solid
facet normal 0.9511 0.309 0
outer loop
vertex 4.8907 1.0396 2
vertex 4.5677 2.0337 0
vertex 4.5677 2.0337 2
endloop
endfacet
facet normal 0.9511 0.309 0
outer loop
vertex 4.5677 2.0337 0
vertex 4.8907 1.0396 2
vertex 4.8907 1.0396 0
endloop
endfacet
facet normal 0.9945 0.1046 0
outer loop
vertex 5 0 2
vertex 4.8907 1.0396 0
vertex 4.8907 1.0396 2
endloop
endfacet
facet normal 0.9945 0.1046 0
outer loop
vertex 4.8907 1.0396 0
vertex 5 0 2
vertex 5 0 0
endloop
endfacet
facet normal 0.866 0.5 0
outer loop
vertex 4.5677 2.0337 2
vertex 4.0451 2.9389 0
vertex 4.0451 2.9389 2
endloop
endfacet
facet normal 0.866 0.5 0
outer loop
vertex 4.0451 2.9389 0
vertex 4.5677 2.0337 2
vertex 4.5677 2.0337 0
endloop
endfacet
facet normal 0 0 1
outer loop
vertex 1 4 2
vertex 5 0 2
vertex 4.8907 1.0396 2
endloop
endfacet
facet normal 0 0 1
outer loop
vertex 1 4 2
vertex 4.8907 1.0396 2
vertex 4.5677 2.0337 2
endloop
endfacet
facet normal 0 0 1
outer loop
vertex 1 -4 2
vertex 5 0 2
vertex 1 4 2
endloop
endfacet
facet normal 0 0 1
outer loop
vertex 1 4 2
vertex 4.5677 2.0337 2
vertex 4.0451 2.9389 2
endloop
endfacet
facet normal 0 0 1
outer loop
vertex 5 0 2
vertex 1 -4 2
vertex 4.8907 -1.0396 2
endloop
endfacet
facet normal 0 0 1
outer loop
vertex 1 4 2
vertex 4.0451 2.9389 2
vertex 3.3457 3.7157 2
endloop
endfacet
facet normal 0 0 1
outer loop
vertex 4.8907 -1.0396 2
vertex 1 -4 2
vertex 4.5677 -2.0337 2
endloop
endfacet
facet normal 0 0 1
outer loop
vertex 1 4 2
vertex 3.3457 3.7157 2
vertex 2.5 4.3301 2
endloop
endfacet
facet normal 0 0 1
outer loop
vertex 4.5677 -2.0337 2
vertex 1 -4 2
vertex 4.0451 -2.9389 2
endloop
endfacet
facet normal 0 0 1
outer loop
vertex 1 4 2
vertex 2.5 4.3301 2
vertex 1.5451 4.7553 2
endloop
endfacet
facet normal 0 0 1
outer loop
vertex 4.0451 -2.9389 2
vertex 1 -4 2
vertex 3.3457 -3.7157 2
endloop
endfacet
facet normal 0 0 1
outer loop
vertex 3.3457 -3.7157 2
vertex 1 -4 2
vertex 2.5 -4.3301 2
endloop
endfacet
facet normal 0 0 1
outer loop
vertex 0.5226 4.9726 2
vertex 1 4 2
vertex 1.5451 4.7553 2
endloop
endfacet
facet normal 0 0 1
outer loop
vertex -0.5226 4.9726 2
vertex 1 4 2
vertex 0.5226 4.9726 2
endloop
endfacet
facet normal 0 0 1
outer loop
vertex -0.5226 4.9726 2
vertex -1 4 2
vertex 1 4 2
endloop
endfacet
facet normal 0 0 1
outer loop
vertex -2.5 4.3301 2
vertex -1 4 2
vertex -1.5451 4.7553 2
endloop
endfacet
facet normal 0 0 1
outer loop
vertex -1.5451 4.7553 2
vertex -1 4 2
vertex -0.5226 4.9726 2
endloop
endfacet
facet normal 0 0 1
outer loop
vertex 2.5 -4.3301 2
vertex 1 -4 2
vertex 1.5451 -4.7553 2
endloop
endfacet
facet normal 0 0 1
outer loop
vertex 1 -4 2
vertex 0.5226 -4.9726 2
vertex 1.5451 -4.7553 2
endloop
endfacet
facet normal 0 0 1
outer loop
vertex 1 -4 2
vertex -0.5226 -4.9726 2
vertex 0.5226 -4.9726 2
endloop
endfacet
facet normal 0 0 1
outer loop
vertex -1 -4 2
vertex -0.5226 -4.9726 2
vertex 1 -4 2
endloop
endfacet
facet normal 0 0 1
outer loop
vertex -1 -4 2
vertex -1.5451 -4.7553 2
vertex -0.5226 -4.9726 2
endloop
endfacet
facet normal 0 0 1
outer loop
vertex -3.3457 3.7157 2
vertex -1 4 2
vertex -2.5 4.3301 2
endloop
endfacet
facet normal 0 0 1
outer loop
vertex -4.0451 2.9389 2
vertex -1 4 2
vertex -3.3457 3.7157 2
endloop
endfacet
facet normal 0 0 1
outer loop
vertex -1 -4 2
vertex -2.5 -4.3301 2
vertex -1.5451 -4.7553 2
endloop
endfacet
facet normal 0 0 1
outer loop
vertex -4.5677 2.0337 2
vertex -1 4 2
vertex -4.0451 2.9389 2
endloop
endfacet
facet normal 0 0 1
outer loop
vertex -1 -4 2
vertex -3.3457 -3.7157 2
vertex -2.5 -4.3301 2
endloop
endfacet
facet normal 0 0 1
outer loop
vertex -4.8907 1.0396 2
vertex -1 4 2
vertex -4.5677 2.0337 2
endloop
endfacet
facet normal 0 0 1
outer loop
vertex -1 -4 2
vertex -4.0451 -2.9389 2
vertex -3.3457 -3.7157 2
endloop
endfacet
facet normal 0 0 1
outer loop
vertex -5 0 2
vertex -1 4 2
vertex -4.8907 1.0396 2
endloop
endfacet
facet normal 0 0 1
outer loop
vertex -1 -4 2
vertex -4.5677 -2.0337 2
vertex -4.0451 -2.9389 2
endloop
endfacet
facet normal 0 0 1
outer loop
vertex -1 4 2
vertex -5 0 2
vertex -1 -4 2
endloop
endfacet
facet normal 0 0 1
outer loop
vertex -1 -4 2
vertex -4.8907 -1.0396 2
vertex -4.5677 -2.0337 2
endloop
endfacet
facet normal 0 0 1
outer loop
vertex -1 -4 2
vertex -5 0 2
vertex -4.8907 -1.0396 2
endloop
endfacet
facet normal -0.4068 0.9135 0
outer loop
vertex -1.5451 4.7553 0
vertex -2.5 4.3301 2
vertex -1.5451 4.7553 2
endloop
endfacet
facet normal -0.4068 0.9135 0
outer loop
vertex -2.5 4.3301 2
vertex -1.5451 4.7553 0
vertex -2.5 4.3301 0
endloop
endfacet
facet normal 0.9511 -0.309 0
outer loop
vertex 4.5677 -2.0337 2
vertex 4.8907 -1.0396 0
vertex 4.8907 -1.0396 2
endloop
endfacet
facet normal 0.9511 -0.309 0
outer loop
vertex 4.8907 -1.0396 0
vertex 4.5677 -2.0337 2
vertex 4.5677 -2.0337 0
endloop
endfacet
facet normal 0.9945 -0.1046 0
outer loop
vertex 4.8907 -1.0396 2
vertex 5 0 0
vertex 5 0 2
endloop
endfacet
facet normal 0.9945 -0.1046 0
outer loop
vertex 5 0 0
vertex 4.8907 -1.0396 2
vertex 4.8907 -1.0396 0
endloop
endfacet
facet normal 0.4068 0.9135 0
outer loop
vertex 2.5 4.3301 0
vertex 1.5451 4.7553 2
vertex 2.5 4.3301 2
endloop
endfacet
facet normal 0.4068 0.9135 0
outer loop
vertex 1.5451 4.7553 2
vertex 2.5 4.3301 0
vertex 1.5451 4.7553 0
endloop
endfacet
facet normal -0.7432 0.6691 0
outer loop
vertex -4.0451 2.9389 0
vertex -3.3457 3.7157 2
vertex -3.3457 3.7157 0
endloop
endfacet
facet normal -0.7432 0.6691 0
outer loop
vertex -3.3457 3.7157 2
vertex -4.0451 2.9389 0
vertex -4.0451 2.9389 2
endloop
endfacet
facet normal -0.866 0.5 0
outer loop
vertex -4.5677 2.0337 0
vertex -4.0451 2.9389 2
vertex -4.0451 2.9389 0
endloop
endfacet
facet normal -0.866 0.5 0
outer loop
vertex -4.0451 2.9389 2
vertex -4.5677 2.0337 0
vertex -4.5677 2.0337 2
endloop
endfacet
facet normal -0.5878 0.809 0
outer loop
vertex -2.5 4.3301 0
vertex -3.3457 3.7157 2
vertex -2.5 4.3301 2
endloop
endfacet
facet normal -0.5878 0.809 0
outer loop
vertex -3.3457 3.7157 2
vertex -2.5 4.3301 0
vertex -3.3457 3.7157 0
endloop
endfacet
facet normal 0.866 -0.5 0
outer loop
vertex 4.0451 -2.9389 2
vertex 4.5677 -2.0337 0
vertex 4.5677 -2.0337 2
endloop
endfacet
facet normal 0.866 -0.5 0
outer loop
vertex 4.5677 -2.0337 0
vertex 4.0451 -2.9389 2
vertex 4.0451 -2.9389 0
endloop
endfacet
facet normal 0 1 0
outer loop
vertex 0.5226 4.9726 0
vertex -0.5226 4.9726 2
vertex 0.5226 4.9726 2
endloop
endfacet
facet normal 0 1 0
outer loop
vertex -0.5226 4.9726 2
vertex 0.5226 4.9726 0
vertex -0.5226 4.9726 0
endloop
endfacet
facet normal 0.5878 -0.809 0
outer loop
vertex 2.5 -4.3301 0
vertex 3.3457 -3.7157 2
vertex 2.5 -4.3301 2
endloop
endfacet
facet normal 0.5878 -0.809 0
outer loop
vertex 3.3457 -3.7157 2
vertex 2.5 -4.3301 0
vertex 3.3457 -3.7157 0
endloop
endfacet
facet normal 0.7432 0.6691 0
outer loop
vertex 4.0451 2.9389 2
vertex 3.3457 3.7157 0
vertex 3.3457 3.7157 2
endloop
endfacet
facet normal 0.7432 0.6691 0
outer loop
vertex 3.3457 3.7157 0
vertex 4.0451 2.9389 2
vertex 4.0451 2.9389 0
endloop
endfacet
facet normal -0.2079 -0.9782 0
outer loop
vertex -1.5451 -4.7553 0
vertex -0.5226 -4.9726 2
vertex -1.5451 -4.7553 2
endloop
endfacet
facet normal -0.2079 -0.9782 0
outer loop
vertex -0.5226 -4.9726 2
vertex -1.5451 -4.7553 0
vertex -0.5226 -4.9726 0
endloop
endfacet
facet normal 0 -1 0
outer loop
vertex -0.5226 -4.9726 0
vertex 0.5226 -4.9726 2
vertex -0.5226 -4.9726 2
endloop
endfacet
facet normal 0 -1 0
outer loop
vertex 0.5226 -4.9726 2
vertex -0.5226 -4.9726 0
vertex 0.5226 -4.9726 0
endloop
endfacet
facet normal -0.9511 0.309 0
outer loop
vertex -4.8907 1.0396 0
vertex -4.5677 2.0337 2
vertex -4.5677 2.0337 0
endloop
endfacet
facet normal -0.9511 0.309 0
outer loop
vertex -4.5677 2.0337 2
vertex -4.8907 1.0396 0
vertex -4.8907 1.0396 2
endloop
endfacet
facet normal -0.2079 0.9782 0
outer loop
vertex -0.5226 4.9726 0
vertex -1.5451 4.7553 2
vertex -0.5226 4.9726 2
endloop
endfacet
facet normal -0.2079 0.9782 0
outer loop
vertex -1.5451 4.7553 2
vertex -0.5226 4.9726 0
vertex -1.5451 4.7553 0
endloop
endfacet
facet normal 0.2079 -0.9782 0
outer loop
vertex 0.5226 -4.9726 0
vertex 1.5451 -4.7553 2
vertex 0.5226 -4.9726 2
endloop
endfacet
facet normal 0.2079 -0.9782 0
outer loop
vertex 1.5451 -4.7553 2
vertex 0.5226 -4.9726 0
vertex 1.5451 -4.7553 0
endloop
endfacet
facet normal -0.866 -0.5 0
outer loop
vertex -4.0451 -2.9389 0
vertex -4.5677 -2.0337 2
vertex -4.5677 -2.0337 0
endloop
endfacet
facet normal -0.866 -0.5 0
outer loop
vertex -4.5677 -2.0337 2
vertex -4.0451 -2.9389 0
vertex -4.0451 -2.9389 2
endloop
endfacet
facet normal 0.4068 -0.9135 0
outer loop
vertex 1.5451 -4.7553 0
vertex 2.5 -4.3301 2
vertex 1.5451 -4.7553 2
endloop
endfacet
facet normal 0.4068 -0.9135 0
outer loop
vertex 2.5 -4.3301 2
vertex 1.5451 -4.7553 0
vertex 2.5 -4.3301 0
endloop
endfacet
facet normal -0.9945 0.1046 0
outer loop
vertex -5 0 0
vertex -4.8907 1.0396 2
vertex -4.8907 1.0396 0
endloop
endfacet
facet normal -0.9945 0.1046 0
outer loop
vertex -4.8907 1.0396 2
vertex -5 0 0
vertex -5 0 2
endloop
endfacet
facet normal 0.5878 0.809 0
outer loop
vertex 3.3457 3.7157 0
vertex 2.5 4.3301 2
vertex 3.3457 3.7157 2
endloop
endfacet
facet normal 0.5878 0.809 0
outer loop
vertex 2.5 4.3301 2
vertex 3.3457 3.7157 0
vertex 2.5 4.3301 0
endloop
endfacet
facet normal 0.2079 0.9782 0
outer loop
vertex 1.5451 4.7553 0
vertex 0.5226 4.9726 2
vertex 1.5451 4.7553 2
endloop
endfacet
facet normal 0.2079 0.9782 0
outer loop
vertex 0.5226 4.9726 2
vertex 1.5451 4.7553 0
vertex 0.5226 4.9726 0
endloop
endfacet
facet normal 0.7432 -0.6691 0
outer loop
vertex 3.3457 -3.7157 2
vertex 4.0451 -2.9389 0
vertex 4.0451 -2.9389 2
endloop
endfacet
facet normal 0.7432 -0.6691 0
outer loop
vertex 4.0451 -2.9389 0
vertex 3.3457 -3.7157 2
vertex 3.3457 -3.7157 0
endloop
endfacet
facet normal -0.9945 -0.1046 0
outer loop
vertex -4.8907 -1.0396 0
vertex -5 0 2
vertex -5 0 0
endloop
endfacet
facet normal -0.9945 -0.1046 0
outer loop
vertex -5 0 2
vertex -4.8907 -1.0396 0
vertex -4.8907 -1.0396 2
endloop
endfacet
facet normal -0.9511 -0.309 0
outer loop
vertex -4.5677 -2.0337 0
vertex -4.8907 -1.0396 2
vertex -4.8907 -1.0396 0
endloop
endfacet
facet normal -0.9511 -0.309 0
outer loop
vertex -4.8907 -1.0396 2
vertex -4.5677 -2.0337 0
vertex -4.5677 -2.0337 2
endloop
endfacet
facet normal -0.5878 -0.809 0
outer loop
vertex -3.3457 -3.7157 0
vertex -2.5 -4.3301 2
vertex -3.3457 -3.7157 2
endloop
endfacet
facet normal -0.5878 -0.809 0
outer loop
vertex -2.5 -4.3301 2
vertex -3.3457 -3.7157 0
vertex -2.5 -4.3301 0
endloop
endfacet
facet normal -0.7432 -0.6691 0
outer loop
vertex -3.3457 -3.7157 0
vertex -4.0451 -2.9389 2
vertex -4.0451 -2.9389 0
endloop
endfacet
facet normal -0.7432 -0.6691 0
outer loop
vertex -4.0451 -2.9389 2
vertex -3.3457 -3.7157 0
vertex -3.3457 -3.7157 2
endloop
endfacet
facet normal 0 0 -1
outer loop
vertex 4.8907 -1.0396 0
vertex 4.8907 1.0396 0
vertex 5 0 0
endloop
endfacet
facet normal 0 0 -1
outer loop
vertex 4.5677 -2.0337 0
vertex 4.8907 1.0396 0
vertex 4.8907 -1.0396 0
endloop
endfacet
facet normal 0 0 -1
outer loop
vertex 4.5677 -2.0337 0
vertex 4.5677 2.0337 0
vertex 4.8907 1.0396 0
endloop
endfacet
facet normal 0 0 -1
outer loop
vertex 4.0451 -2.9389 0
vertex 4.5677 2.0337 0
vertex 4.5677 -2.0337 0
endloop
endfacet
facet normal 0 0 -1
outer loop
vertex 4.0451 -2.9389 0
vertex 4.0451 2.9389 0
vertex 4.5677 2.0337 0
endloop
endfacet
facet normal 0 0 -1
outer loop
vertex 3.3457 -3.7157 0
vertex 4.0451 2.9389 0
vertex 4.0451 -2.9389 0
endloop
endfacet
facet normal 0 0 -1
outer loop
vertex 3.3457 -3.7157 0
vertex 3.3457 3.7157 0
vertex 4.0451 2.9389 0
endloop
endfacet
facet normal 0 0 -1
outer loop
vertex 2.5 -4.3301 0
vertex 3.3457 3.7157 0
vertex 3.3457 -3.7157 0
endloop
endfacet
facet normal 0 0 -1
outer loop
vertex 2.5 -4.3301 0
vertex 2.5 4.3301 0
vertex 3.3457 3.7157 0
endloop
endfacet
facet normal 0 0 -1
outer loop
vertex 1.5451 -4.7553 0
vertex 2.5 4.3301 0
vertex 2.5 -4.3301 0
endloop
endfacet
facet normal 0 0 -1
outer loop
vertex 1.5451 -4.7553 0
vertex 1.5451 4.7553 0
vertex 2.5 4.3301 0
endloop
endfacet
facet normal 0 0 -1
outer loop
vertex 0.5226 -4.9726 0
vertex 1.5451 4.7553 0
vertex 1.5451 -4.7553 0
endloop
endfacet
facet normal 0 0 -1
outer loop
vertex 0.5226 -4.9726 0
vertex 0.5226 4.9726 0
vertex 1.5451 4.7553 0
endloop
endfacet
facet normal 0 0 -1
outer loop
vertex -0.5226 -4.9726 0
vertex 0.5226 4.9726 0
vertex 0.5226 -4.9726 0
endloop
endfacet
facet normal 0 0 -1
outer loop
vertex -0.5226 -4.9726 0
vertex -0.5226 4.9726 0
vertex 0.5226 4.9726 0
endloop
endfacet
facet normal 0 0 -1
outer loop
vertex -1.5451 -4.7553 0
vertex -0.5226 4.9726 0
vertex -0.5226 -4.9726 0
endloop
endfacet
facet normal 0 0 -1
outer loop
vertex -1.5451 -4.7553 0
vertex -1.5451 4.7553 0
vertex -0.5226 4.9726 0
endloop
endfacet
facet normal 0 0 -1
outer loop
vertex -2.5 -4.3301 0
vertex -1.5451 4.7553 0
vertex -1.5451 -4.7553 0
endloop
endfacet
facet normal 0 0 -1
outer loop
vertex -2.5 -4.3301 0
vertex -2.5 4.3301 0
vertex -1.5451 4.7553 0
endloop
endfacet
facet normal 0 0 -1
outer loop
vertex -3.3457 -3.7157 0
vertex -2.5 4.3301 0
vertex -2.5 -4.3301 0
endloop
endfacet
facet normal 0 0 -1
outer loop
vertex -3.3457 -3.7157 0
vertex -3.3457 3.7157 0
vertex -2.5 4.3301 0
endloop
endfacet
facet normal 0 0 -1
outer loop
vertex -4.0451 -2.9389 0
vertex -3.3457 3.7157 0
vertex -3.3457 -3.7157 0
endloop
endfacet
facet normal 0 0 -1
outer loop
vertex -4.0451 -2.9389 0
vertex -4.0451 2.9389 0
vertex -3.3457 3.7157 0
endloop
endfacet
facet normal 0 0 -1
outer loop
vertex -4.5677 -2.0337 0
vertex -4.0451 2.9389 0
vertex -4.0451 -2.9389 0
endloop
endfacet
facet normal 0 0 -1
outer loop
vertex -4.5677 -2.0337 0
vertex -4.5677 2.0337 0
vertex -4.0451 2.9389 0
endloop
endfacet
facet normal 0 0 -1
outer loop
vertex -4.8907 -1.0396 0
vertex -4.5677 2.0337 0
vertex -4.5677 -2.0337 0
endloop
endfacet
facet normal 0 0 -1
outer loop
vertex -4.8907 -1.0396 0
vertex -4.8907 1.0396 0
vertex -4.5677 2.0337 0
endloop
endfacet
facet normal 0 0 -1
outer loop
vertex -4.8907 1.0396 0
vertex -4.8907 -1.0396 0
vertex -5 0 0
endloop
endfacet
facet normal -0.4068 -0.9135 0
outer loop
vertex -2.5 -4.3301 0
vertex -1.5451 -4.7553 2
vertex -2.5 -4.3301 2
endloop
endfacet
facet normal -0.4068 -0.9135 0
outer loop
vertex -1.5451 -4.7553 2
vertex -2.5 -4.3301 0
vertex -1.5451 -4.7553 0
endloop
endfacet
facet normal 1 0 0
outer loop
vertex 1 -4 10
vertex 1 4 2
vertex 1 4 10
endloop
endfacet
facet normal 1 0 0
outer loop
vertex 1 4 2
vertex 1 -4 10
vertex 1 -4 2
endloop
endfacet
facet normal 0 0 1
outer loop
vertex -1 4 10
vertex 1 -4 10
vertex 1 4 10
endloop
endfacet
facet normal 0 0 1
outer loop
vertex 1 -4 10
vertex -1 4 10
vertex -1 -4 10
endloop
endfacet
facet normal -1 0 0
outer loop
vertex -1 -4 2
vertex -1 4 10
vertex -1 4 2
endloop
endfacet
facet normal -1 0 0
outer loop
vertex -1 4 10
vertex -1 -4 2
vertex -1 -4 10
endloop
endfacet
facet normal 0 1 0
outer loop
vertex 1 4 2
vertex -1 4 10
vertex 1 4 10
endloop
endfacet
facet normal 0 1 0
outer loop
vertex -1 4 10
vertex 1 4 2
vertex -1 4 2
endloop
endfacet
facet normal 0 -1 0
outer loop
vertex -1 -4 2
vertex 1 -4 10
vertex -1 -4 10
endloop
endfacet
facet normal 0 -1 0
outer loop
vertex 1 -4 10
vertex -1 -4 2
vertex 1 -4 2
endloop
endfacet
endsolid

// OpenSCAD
cylinder(r= 5, h=2, $fn=30);
translate([-1,-4,0]) cube([2,8,10]);
